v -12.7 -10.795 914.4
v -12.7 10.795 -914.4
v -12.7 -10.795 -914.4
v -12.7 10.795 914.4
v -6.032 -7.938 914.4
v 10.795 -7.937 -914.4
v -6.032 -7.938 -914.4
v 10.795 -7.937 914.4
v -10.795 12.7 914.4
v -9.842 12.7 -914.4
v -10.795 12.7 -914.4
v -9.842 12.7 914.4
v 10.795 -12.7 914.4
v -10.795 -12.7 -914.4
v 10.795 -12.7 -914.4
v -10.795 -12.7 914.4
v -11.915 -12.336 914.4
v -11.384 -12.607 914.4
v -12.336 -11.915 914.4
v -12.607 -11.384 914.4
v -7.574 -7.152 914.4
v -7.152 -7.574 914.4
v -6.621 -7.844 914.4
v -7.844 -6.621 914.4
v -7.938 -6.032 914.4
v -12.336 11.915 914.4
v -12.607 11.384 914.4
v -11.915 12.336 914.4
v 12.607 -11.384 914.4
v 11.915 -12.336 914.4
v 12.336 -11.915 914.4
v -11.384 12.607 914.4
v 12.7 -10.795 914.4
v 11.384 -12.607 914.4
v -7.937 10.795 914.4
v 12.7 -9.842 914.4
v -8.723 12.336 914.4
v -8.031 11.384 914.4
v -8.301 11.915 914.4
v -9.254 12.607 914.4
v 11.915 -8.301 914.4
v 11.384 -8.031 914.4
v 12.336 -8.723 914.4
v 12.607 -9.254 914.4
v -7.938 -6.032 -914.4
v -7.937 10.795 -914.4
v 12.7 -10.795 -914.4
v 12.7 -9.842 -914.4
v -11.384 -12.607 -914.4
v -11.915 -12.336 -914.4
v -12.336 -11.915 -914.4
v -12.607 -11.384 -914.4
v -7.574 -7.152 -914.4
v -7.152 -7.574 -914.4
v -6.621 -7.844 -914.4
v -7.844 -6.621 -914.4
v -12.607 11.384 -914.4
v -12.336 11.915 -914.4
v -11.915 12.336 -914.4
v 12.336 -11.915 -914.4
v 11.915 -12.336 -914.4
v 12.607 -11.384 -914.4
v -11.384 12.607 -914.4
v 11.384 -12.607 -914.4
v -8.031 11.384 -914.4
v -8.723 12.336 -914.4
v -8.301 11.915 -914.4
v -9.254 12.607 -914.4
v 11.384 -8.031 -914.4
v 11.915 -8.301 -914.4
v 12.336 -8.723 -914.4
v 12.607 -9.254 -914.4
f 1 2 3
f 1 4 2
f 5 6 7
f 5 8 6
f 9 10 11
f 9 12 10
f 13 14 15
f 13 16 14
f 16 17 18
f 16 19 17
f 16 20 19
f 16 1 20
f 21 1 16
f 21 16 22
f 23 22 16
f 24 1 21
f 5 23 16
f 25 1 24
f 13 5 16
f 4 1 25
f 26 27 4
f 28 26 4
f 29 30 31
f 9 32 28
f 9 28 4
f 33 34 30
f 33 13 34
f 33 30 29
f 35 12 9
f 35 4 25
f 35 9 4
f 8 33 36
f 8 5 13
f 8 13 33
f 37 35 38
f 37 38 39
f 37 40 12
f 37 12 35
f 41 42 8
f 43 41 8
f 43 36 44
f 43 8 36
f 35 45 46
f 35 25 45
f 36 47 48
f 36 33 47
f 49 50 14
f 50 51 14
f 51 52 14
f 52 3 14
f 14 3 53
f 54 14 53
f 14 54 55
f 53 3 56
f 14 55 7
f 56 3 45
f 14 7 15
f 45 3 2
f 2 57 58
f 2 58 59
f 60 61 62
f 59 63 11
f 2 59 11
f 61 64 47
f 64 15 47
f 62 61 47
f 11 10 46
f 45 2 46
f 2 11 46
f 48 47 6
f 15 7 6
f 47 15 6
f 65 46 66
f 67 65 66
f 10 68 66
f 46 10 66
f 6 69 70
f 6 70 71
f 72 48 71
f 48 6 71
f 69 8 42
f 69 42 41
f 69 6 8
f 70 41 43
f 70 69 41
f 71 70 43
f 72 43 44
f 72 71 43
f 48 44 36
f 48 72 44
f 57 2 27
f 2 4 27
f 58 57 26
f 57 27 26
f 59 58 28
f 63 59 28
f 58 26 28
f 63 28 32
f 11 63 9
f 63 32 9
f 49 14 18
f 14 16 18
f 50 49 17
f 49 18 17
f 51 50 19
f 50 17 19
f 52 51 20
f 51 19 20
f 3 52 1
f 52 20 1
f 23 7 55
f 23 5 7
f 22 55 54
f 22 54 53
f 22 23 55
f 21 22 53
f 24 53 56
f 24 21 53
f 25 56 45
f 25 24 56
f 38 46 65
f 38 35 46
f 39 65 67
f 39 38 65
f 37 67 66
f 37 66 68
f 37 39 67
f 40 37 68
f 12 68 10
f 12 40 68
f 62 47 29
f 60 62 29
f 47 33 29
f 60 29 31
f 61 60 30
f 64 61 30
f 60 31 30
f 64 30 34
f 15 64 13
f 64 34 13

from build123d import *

# Parameters (mm, degrees)
BOSS_EXTRUDE1_DEPTH      = 914.4
BOSS_EXTRUDE1_DEPTH_BACK = 914.4
FILLET1_R                = 1.905


with BuildPart() as part:
    # Sketch4 → Boss-Extrude1 (new body, two sides)
    with BuildSketch(Plane.XY) as boss_extrude1_sk:
        with BuildLine():
            Line((-7.9375, -6.0325), (-7.9375, 12.7))
            Line((-7.9375, 12.7), (-12.7, 12.7))
            Line((-12.7, 12.7), (-12.7, -12.7))
            Line((-12.7, -12.7), (12.7, -12.7))
            Line((12.7, -12.7), (12.7, -7.9375))
            Line((12.7, -7.9375), (-6.0325, -7.9375))
            ThreePointArc((-6.0325, -7.9375), (-7.379538418, -7.379538418), (-7.9375, -6.0325))
        make_face()
    extrude(amount=BOSS_EXTRUDE1_DEPTH)
    extrude(boss_extrude1_sk.sketch, amount=-BOSS_EXTRUDE1_DEPTH_BACK)

    # Fillet1
    fillet1_edges = [part.edges().sort_by_distance(p)[0] for p in [
        (-7.9375, 12.7, 0),
        (12.7, -7.9375, 0),
        (12.7, -12.7, 0),
        (-12.7, -12.7, 0),
        (-12.7, 12.7, 0),
    ]]
    fillet(fillet1_edges, radius=FILLET1_R)


solid = part.part
